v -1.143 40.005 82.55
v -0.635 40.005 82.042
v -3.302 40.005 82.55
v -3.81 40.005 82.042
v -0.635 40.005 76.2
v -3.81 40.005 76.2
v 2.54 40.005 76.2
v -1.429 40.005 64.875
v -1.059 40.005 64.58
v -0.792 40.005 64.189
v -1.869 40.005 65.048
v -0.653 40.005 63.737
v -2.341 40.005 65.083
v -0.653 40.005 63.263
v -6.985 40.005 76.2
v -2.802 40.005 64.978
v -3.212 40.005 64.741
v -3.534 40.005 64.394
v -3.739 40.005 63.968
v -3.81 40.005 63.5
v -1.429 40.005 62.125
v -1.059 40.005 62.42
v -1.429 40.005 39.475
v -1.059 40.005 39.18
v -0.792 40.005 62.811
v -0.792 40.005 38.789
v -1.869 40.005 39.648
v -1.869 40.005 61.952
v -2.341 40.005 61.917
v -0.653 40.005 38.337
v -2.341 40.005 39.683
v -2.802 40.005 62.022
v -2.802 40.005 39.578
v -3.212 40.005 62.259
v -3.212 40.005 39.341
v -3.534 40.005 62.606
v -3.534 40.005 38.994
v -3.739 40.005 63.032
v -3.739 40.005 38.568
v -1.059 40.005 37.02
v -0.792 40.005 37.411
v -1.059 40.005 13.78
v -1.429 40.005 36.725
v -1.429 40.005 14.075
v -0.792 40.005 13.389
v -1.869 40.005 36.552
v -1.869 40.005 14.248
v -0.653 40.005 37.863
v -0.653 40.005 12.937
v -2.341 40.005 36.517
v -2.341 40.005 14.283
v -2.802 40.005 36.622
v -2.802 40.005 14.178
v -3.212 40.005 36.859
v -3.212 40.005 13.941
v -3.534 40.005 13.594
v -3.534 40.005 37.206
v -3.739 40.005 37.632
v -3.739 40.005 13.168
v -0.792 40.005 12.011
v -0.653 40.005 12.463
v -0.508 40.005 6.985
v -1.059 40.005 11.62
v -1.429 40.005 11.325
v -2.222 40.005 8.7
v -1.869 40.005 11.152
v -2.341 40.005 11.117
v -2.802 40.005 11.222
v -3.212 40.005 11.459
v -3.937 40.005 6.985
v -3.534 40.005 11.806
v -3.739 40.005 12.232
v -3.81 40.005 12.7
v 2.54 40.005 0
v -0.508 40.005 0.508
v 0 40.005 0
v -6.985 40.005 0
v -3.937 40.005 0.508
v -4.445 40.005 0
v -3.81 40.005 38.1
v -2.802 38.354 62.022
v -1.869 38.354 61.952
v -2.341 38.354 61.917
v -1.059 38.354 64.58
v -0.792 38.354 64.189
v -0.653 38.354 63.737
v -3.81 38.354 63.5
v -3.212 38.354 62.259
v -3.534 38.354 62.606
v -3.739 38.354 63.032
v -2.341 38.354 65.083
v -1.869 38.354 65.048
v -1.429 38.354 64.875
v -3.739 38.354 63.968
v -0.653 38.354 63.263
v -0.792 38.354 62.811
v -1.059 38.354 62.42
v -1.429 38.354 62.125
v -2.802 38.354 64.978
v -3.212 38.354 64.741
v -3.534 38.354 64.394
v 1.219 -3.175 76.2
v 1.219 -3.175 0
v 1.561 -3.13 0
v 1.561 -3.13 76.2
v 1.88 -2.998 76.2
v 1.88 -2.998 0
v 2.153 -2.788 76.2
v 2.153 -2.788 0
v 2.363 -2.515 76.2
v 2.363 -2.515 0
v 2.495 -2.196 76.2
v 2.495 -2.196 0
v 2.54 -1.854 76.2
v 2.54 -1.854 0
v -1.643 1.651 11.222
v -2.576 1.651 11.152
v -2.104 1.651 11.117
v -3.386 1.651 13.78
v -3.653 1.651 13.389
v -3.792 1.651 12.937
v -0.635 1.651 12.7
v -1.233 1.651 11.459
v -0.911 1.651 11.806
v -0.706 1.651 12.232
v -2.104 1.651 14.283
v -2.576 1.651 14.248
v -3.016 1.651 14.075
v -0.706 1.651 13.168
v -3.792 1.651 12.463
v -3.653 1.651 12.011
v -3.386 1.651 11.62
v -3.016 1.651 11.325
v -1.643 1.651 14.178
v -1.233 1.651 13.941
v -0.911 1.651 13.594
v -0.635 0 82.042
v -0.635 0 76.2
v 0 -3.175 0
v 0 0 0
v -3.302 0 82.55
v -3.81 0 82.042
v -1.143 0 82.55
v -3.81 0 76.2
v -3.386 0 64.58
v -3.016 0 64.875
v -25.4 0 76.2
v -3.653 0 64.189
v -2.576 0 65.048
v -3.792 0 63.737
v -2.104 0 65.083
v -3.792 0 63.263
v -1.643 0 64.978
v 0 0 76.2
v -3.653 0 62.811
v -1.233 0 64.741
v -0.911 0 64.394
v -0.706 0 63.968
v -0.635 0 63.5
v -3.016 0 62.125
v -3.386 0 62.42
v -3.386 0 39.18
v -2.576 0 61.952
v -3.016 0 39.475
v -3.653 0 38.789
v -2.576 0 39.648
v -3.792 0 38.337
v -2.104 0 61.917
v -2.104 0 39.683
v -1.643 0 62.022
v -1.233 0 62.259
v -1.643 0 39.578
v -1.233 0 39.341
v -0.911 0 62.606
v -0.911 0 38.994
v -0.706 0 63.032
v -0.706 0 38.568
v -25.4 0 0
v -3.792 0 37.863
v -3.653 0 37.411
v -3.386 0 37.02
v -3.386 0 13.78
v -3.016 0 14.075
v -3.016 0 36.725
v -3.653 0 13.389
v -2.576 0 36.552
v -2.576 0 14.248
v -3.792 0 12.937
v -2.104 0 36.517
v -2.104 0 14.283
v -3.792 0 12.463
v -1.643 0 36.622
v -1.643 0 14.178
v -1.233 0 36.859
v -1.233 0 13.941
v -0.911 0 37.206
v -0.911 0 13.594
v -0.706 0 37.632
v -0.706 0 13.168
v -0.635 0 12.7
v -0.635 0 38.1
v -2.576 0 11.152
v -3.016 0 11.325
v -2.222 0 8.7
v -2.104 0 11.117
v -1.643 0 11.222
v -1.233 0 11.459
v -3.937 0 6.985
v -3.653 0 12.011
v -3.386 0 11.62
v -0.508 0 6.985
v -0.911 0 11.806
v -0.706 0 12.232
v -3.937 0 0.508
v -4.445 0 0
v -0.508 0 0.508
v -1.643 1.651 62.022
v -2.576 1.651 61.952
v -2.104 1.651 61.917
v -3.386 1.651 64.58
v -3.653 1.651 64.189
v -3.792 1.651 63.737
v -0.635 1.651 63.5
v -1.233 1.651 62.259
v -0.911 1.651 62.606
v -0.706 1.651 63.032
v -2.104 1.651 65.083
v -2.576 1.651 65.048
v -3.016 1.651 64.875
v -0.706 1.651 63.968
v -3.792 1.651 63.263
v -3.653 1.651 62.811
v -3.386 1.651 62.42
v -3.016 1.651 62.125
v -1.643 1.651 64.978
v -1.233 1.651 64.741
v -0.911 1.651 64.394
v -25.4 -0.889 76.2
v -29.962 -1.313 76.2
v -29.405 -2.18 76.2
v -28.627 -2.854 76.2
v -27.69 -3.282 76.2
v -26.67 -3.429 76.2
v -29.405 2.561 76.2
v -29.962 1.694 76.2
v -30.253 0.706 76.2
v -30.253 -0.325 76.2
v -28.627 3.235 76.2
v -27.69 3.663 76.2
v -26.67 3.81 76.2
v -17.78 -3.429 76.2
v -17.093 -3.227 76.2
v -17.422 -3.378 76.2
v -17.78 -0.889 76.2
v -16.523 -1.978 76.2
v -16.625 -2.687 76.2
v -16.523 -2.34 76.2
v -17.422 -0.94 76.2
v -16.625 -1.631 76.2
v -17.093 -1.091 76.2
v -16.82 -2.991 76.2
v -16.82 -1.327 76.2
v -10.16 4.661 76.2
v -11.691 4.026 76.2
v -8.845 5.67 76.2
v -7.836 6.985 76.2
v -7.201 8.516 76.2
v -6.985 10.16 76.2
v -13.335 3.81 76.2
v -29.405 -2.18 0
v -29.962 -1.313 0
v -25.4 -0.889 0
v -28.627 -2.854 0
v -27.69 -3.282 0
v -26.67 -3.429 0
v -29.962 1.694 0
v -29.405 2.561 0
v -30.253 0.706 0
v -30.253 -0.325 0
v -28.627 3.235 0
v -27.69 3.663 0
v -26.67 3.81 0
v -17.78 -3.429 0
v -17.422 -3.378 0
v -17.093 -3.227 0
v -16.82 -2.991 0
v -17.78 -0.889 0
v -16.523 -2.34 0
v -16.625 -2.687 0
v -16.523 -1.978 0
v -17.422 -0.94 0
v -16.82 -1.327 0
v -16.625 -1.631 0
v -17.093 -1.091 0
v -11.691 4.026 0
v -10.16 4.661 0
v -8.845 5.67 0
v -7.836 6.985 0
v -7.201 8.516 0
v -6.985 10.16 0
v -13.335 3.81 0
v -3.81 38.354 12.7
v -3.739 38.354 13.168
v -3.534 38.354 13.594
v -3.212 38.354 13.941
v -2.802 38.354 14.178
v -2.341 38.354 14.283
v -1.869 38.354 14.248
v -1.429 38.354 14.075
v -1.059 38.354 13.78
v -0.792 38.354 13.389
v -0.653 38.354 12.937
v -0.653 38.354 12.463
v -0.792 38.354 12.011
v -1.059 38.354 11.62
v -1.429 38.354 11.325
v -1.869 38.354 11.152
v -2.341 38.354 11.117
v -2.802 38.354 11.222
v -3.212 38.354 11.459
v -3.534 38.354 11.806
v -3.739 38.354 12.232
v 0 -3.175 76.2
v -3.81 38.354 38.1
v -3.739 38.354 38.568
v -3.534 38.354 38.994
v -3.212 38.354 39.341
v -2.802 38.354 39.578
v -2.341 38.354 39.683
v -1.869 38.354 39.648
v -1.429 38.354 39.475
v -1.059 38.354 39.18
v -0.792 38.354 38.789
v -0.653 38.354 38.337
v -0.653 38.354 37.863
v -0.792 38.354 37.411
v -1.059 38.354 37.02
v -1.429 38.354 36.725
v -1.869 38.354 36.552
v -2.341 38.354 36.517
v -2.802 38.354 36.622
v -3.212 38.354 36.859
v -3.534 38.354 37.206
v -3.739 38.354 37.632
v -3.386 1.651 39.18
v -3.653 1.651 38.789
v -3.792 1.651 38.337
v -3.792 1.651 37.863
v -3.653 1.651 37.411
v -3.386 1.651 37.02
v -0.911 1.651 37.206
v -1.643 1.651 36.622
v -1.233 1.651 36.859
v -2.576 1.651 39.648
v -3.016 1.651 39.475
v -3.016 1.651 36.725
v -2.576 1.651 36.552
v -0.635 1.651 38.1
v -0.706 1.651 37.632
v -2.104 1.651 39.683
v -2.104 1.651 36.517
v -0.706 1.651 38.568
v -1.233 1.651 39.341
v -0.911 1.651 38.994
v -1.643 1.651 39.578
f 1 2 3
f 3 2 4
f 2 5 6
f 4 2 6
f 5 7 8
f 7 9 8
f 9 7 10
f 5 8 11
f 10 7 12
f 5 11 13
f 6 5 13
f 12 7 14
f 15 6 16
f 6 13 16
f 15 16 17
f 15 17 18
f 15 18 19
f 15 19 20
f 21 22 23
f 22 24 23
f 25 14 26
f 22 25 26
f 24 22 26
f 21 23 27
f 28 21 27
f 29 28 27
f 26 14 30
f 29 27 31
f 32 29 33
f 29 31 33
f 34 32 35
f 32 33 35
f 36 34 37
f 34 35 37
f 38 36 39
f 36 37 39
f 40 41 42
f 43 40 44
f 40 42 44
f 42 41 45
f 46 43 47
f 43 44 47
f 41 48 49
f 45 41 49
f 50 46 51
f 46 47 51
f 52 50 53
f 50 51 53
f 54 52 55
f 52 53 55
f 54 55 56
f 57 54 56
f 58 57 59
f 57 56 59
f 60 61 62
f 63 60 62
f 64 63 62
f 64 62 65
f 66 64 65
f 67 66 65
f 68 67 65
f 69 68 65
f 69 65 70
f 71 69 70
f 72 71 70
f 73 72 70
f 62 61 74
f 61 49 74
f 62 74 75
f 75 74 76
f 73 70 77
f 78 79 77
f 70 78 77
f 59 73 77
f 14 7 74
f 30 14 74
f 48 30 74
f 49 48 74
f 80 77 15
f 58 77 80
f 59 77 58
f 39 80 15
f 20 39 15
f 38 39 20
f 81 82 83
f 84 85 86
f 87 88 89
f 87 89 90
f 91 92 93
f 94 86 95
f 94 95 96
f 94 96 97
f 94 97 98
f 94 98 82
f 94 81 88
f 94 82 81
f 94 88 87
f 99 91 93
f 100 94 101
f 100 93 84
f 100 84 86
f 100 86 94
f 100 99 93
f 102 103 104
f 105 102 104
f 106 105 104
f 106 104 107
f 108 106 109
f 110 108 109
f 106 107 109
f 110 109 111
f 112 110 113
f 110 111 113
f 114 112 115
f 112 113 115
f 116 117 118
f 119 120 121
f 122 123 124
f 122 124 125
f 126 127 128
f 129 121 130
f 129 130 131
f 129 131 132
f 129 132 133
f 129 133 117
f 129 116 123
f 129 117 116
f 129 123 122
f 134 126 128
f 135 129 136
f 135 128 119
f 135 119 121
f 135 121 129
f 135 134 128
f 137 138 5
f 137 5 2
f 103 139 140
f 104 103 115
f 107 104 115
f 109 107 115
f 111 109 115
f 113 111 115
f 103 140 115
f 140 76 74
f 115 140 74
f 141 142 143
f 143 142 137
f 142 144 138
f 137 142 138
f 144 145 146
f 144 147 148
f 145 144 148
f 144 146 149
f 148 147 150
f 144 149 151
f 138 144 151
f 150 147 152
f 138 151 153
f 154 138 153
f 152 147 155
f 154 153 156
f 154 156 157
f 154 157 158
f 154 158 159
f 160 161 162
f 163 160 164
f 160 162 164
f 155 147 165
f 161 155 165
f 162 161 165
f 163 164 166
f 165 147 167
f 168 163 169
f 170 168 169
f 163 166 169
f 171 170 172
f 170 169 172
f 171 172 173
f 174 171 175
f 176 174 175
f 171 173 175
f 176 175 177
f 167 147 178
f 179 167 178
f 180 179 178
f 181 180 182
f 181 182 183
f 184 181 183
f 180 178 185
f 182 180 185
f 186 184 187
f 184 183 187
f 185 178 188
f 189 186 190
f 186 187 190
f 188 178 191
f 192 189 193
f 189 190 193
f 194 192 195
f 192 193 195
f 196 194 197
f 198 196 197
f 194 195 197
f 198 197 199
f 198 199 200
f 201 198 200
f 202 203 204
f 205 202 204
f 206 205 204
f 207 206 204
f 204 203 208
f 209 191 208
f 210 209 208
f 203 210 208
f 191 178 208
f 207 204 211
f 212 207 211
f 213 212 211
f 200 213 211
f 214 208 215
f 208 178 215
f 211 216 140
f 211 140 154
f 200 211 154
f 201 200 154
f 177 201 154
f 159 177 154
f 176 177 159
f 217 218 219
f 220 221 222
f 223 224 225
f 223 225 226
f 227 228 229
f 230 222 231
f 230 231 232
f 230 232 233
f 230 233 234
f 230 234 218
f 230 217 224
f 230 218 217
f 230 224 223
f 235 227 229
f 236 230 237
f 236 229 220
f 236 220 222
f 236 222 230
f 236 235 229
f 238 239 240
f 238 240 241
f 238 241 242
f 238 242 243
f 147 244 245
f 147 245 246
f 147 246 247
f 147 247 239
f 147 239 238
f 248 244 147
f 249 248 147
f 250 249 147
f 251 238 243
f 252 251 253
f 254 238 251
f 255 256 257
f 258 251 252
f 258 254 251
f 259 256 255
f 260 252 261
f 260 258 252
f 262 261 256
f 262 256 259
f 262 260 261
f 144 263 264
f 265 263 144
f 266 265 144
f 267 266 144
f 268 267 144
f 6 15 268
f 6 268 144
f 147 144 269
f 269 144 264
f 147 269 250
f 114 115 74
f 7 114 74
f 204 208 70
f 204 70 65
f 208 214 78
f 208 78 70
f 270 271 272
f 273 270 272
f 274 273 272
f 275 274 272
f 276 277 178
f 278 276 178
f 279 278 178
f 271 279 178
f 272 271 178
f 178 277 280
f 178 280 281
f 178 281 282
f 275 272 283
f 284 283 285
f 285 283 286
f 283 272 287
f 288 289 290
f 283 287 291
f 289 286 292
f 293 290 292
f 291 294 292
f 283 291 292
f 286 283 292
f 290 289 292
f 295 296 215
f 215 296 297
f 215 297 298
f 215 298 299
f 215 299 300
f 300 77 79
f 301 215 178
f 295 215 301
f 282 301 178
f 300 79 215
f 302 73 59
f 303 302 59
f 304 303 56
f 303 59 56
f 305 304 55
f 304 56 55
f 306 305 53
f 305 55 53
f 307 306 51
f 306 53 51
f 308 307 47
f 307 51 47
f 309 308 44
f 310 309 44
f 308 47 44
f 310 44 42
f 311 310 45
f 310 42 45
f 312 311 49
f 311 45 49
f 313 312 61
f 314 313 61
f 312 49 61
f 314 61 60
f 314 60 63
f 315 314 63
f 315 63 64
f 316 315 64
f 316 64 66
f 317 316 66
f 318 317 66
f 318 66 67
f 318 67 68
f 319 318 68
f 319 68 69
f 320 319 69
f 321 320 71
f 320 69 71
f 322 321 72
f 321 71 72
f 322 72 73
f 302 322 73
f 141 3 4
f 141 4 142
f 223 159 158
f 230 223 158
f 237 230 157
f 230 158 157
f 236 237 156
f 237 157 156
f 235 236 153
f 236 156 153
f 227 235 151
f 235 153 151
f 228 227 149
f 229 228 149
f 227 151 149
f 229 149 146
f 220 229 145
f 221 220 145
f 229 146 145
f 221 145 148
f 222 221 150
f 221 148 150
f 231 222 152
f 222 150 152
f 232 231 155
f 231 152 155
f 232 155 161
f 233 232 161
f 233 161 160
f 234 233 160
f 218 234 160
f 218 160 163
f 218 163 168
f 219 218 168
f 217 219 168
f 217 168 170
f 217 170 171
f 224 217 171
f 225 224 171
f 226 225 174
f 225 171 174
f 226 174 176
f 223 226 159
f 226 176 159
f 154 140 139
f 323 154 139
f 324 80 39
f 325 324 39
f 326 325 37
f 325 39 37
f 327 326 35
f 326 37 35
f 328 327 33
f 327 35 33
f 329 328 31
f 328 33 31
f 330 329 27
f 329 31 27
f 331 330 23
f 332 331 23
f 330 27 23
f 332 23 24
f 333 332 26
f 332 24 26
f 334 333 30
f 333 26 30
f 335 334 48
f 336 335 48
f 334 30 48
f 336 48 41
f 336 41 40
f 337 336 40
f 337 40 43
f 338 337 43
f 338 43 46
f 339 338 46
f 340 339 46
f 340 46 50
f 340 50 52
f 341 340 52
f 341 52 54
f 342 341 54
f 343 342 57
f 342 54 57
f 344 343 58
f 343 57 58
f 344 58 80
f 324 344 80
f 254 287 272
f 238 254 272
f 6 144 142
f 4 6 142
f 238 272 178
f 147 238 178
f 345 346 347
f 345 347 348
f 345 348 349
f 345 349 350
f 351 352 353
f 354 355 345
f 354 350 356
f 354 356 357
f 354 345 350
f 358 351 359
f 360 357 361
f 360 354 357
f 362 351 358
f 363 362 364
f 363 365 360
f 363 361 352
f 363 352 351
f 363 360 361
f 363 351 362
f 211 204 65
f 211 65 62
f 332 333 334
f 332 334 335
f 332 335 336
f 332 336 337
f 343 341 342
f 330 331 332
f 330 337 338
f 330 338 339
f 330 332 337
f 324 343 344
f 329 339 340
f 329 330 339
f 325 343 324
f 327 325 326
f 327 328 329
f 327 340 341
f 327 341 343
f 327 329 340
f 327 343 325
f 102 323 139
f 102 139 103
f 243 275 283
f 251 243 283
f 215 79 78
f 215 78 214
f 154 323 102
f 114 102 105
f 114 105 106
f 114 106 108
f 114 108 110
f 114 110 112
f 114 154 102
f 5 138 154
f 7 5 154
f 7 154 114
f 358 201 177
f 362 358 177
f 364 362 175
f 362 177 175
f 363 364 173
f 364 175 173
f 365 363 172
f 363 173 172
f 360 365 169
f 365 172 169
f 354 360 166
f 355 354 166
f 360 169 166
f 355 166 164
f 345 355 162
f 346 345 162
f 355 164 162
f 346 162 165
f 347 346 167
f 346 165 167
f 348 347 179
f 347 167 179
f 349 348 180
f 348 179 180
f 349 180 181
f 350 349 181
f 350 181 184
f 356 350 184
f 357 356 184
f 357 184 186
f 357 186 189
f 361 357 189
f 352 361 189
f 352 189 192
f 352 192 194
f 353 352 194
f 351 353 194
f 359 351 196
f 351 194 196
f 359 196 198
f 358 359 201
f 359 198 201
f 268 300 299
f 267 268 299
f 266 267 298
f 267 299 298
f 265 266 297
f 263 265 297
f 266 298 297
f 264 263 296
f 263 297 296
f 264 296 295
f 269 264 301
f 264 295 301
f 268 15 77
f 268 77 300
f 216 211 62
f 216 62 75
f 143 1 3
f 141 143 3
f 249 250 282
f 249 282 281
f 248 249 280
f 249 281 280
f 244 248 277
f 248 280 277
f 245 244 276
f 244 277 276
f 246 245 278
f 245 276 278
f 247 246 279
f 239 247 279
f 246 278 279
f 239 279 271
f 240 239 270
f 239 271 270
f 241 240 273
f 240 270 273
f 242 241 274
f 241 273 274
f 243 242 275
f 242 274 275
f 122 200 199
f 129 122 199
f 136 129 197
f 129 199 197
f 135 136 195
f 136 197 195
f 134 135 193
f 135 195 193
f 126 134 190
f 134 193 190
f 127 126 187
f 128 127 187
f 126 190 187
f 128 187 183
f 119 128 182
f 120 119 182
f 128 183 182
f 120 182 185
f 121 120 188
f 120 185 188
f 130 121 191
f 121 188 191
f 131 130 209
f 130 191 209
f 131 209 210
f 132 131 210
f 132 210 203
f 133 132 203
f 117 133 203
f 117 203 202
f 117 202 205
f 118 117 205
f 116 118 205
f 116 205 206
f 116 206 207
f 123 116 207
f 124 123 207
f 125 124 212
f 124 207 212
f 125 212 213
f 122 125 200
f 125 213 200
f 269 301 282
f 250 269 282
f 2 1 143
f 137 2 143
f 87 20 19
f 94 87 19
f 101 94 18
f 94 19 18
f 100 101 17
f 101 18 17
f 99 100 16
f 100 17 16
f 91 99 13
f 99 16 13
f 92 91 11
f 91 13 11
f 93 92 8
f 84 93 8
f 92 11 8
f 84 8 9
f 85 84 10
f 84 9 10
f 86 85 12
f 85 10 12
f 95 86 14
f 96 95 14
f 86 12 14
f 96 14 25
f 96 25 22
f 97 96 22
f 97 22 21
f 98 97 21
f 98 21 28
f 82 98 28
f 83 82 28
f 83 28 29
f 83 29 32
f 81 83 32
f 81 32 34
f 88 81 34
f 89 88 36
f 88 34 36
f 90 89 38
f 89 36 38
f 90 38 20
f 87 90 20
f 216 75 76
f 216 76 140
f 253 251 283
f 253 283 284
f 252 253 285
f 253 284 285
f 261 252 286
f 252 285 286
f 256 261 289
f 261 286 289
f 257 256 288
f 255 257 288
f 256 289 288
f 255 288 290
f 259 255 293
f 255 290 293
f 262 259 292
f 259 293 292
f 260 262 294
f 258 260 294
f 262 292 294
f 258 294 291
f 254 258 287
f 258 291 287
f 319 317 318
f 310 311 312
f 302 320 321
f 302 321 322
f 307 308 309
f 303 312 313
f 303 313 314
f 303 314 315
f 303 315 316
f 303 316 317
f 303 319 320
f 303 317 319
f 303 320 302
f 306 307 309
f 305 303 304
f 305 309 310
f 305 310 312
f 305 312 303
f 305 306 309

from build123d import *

# Parameters (mm, degrees)
F1_DEPTH  = 76.2
F3_DEPTH  = 43.435
F4_W      = 3.175
F4_H      = 6.35
F5_DEPTH  = 40.005
F6_SIZE   = 0.508
F7_R      = 1.5875
F8_DEPTH  = 1.651
F9_R      = 1.5875
F10_DEPTH = 1.651


with BuildPart() as f1:
    # F0 (on Top) → F1 (new body)
    with BuildSketch(Plane.XY):
        with BuildLine():
            Line((2.54, 40.005), (-6.985, 40.005))
            Line((-6.985, 40.005), (-6.985, 10.16))
            ThreePointArc((-6.985, 10.16), (-8.8448719395, 5.6698719395), (-13.335, 3.81))
            Line((-13.335, 3.81), (-26.67, 3.81))
            ThreePointArc((-26.67, 3.81), (-30.2895, 0.1905), (-26.67, -3.429))
            Line((-26.67, -3.429), (-17.78, -3.429))
            ThreePointArc((-17.78, -3.429), (-16.51, -2.159), (-17.78, -0.889))
            Line((-17.78, -0.889), (-25.4, -0.889))
            Line((-25.4, -0.889), (-25.4, 0))
            Line((-25.4, 0), (0, 0))
            Line((0, 0), (0, -3.175))
            Line((0, -3.175), (1.2192, -3.175))
            ThreePointArc((1.2192, -3.175), (2.1531466366, -2.7881466366), (2.54, -1.8542))
            Line((2.54, -1.8542), (2.54, 40.005))
        make_face()
    extrude(amount=F1_DEPTH)

    # F2 (on face) → F3 (cut, through all)
    with BuildSketch(Plane(origin=(0, 40.005, 0), x_dir=(-1, 0, 0), z_dir=(0, 1, 0))):
        Polygon((0.508, 6.985), (0.508, 0), (3.937, 0), (3.937, 6.985), (2.2225, 8.6995), align=None)
    extrude(amount=-F3_DEPTH, mode=Mode.SUBTRACT)

    # F4 (on face) → F5 (join, through all)
    with BuildSketch(Plane(origin=(0, 40.005, 0), x_dir=(-1, 0, 0), z_dir=(0, 1, 0))):
        with Locations((2.2225, 79.375)):
            Rectangle(F4_W, F4_H)
    extrude(amount=-F5_DEPTH)

    # F6
    f6_edges = [f1.edges().sort_by_distance(p)[0] for p in [
        (-3.937, 20.0025, 0),
        (-0.508, 20.0025, 0),
        (-0.635, 20.0025, 82.55),
        (-3.81, 20.0025, 82.55),
    ]]
    chamfer(f6_edges, length=F6_SIZE)

    # F7 (on face) → F8 (cut)
    with BuildSketch(Plane(origin=(0, 40.005, 0), x_dir=(-1, 0, 0), z_dir=(0, 1, 0))):
        with Locations((2.2225, 12.7)):
            Circle(F7_R)
        with Locations((2.2225, 38.1)):
            Circle(F7_R)
        with Locations((2.2225, 63.5)):
            Circle(F7_R)
    extrude(amount=-F8_DEPTH, mode=Mode.SUBTRACT)

    # F9 (on face) → F10 (cut)
    with BuildSketch(Plane.XZ):
        with Locations((-2.2225, 12.7)):
            Circle(F9_R)
        with Locations((-2.2225, 38.1)):
            Circle(F9_R)
        with Locations((-2.2225, 63.5)):
            Circle(F9_R)
    extrude(amount=-F10_DEPTH, mode=Mode.SUBTRACT)


solid = f1.part
